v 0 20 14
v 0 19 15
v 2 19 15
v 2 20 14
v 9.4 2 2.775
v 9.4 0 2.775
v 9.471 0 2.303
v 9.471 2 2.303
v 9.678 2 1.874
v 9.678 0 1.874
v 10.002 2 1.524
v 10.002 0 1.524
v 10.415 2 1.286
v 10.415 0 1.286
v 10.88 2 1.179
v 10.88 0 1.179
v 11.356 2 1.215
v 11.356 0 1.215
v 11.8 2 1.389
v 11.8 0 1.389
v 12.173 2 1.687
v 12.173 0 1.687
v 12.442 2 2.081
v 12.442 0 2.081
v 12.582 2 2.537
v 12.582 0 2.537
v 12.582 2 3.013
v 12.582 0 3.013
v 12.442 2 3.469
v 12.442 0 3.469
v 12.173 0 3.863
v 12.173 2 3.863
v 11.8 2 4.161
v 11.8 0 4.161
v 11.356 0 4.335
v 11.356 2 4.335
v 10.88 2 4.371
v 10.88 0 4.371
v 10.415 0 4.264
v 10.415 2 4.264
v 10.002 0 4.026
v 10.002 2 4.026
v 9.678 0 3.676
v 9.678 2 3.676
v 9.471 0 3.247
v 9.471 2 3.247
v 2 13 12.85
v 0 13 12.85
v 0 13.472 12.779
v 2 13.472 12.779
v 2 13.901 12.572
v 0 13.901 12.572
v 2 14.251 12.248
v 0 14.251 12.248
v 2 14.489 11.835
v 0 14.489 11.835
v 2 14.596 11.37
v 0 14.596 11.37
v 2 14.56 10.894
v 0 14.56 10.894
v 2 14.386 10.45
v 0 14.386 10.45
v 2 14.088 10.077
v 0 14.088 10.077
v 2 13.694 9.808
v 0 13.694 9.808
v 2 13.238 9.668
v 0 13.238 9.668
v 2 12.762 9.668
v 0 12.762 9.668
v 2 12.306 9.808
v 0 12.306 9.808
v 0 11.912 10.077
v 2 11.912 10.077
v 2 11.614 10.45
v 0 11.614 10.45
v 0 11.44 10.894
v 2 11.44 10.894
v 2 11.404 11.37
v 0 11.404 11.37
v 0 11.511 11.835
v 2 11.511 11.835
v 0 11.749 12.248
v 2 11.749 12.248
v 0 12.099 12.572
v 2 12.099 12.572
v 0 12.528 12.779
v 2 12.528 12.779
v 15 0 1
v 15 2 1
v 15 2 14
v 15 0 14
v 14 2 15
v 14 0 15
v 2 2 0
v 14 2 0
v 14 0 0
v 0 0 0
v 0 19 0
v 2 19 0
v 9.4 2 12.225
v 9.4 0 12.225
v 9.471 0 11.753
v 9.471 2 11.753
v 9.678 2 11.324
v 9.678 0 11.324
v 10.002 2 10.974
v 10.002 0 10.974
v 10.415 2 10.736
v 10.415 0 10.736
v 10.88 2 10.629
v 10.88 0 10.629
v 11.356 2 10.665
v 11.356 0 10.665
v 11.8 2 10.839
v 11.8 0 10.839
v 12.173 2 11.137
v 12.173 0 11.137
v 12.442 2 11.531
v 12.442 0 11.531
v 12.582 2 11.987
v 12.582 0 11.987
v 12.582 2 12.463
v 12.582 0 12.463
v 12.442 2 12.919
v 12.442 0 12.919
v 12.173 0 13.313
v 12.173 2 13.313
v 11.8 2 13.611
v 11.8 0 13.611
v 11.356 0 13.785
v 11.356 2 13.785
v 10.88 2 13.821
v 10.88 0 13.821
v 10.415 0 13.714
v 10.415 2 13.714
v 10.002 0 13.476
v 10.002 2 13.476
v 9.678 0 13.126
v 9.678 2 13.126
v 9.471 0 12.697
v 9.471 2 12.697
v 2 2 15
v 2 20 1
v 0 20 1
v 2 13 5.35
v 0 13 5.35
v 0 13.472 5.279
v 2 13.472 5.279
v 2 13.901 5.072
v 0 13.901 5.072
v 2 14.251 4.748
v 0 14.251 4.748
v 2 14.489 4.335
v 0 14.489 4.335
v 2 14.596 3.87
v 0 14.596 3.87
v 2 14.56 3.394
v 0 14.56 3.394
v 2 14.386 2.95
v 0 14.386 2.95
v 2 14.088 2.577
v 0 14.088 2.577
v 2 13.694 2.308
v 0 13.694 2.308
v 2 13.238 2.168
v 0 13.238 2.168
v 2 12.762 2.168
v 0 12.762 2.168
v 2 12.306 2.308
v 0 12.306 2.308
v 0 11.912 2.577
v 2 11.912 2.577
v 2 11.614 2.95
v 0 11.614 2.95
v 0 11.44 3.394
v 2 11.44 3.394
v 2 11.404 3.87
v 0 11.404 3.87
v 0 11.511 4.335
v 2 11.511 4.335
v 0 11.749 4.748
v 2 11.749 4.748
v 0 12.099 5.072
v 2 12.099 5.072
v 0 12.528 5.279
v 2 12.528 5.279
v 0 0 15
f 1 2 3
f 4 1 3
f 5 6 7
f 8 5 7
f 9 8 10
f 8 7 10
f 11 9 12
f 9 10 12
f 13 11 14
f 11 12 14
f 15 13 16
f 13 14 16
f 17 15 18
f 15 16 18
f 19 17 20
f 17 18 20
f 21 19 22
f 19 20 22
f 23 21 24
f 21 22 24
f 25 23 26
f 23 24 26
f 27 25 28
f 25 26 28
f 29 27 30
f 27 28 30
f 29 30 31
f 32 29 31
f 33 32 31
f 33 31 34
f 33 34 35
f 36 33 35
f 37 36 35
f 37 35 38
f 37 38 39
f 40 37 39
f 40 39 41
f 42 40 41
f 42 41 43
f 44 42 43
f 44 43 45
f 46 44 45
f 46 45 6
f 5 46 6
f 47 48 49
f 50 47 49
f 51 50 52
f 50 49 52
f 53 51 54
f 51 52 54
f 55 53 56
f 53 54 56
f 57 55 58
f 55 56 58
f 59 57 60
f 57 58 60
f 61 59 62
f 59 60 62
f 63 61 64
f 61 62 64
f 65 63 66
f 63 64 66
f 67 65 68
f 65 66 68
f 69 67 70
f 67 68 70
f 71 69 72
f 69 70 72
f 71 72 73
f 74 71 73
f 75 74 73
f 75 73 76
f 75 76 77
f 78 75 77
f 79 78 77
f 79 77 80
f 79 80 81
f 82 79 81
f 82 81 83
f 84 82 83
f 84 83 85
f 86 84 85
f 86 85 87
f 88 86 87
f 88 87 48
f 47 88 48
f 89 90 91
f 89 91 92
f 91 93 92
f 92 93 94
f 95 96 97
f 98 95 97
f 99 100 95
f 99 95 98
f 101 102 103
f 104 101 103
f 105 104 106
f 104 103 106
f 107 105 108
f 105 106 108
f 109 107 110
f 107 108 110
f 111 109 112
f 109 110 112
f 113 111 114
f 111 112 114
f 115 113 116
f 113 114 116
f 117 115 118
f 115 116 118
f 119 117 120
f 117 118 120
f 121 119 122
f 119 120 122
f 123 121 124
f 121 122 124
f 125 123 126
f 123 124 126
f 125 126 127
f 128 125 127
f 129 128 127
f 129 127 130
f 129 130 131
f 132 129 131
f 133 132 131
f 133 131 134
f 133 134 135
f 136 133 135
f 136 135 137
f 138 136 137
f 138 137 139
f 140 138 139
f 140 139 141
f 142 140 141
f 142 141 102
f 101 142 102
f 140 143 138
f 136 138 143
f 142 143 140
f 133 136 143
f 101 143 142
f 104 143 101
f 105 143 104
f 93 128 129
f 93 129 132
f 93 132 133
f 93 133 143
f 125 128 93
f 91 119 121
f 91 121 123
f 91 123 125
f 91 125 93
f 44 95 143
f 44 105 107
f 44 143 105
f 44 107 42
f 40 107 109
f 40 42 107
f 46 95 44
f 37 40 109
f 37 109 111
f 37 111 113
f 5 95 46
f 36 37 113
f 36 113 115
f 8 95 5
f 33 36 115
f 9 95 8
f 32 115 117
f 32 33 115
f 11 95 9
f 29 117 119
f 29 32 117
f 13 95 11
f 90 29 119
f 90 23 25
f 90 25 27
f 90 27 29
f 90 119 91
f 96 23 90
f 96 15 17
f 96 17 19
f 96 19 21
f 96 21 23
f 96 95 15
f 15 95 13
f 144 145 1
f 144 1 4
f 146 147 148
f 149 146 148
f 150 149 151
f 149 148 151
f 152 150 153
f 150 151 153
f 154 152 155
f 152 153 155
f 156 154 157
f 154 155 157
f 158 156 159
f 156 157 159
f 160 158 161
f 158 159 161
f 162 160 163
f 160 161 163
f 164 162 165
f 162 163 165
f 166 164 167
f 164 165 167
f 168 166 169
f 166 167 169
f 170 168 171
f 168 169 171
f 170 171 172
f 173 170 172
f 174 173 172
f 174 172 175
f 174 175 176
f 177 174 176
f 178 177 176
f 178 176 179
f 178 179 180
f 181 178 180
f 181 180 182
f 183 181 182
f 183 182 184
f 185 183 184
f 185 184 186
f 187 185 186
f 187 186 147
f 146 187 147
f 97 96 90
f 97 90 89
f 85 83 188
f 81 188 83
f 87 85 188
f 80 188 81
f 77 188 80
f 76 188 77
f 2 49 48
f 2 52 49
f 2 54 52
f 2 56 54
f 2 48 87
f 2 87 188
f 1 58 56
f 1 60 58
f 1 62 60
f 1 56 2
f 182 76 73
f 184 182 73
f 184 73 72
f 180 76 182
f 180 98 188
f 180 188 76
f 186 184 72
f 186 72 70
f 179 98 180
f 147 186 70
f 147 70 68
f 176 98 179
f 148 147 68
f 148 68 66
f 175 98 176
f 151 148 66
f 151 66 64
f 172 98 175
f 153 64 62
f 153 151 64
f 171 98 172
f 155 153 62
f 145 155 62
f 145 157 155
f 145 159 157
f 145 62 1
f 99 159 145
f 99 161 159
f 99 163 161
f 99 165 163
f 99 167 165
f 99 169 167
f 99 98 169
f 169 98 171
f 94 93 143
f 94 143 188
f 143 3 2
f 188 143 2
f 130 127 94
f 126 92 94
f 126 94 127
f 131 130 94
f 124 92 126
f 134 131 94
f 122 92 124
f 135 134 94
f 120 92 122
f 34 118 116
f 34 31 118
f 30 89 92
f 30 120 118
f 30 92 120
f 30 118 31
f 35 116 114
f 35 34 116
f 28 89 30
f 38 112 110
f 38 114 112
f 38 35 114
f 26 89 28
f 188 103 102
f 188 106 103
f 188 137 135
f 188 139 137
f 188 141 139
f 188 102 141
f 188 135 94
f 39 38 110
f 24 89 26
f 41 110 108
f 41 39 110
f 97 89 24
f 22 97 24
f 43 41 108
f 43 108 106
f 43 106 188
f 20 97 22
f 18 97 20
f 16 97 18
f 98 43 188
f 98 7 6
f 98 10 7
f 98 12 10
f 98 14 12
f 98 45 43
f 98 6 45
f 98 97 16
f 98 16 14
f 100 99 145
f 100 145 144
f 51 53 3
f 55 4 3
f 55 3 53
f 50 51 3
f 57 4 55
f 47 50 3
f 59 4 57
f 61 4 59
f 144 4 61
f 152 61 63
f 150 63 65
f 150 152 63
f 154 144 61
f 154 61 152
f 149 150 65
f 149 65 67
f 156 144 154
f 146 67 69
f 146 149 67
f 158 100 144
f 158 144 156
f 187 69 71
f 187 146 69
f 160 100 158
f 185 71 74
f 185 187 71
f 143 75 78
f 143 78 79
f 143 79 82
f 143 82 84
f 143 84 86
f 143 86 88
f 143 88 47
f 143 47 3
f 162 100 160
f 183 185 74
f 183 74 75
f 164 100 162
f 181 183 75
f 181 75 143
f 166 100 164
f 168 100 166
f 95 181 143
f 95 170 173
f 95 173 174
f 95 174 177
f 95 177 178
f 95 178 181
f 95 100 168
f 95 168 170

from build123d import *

# Parameters (mm, degrees)
BODY_DEPTH              = 15
CHAMFER1_SIZE           = 1
F_3_2_3_2_FORSENSOR_D   = 3.2
F_3_2_3_2_FORCARRIAGE_D = 3.2


with BuildPart() as part:
    # Sketch1 → Body (new body)
    with BuildSketch(Plane.XY):
        Polygon((0, 0), (0, 20), (2, 20), (2, 2), (15, 2), (15, 0), align=None)
    extrude(amount=BODY_DEPTH)

    # Chamfer1
    chamfer1_edges = [part.edges().sort_by_distance(p)[0] for p in [
        (1, 20, 15),
        (1, 20, 0),
        (15, 1, 15),
        (15, 1, 0),
    ]]
    chamfer(chamfer1_edges, length=CHAMFER1_SIZE)

    # Ø3.2 (3.2) ForSensor (through all)
    with Locations(Plane(origin=(0, 2, 0), x_dir=(1, 0, 0), z_dir=(0, 1, 0))):
        with Locations((11, -2.775), (11, -12.225)):
            Hole(F_3_2_3_2_FORSENSOR_D / 2)

    # Ø3.2 (3.2) ForCarriage (through all)
    with Locations(Plane(origin=(2, 0, 0), x_dir=(0, 0, -1), z_dir=(1, 0, 0))):
        with Locations((-11.25, 13), (-3.75, 13)):
            Hole(F_3_2_3_2_FORCARRIAGE_D / 2)


solid = part.part
